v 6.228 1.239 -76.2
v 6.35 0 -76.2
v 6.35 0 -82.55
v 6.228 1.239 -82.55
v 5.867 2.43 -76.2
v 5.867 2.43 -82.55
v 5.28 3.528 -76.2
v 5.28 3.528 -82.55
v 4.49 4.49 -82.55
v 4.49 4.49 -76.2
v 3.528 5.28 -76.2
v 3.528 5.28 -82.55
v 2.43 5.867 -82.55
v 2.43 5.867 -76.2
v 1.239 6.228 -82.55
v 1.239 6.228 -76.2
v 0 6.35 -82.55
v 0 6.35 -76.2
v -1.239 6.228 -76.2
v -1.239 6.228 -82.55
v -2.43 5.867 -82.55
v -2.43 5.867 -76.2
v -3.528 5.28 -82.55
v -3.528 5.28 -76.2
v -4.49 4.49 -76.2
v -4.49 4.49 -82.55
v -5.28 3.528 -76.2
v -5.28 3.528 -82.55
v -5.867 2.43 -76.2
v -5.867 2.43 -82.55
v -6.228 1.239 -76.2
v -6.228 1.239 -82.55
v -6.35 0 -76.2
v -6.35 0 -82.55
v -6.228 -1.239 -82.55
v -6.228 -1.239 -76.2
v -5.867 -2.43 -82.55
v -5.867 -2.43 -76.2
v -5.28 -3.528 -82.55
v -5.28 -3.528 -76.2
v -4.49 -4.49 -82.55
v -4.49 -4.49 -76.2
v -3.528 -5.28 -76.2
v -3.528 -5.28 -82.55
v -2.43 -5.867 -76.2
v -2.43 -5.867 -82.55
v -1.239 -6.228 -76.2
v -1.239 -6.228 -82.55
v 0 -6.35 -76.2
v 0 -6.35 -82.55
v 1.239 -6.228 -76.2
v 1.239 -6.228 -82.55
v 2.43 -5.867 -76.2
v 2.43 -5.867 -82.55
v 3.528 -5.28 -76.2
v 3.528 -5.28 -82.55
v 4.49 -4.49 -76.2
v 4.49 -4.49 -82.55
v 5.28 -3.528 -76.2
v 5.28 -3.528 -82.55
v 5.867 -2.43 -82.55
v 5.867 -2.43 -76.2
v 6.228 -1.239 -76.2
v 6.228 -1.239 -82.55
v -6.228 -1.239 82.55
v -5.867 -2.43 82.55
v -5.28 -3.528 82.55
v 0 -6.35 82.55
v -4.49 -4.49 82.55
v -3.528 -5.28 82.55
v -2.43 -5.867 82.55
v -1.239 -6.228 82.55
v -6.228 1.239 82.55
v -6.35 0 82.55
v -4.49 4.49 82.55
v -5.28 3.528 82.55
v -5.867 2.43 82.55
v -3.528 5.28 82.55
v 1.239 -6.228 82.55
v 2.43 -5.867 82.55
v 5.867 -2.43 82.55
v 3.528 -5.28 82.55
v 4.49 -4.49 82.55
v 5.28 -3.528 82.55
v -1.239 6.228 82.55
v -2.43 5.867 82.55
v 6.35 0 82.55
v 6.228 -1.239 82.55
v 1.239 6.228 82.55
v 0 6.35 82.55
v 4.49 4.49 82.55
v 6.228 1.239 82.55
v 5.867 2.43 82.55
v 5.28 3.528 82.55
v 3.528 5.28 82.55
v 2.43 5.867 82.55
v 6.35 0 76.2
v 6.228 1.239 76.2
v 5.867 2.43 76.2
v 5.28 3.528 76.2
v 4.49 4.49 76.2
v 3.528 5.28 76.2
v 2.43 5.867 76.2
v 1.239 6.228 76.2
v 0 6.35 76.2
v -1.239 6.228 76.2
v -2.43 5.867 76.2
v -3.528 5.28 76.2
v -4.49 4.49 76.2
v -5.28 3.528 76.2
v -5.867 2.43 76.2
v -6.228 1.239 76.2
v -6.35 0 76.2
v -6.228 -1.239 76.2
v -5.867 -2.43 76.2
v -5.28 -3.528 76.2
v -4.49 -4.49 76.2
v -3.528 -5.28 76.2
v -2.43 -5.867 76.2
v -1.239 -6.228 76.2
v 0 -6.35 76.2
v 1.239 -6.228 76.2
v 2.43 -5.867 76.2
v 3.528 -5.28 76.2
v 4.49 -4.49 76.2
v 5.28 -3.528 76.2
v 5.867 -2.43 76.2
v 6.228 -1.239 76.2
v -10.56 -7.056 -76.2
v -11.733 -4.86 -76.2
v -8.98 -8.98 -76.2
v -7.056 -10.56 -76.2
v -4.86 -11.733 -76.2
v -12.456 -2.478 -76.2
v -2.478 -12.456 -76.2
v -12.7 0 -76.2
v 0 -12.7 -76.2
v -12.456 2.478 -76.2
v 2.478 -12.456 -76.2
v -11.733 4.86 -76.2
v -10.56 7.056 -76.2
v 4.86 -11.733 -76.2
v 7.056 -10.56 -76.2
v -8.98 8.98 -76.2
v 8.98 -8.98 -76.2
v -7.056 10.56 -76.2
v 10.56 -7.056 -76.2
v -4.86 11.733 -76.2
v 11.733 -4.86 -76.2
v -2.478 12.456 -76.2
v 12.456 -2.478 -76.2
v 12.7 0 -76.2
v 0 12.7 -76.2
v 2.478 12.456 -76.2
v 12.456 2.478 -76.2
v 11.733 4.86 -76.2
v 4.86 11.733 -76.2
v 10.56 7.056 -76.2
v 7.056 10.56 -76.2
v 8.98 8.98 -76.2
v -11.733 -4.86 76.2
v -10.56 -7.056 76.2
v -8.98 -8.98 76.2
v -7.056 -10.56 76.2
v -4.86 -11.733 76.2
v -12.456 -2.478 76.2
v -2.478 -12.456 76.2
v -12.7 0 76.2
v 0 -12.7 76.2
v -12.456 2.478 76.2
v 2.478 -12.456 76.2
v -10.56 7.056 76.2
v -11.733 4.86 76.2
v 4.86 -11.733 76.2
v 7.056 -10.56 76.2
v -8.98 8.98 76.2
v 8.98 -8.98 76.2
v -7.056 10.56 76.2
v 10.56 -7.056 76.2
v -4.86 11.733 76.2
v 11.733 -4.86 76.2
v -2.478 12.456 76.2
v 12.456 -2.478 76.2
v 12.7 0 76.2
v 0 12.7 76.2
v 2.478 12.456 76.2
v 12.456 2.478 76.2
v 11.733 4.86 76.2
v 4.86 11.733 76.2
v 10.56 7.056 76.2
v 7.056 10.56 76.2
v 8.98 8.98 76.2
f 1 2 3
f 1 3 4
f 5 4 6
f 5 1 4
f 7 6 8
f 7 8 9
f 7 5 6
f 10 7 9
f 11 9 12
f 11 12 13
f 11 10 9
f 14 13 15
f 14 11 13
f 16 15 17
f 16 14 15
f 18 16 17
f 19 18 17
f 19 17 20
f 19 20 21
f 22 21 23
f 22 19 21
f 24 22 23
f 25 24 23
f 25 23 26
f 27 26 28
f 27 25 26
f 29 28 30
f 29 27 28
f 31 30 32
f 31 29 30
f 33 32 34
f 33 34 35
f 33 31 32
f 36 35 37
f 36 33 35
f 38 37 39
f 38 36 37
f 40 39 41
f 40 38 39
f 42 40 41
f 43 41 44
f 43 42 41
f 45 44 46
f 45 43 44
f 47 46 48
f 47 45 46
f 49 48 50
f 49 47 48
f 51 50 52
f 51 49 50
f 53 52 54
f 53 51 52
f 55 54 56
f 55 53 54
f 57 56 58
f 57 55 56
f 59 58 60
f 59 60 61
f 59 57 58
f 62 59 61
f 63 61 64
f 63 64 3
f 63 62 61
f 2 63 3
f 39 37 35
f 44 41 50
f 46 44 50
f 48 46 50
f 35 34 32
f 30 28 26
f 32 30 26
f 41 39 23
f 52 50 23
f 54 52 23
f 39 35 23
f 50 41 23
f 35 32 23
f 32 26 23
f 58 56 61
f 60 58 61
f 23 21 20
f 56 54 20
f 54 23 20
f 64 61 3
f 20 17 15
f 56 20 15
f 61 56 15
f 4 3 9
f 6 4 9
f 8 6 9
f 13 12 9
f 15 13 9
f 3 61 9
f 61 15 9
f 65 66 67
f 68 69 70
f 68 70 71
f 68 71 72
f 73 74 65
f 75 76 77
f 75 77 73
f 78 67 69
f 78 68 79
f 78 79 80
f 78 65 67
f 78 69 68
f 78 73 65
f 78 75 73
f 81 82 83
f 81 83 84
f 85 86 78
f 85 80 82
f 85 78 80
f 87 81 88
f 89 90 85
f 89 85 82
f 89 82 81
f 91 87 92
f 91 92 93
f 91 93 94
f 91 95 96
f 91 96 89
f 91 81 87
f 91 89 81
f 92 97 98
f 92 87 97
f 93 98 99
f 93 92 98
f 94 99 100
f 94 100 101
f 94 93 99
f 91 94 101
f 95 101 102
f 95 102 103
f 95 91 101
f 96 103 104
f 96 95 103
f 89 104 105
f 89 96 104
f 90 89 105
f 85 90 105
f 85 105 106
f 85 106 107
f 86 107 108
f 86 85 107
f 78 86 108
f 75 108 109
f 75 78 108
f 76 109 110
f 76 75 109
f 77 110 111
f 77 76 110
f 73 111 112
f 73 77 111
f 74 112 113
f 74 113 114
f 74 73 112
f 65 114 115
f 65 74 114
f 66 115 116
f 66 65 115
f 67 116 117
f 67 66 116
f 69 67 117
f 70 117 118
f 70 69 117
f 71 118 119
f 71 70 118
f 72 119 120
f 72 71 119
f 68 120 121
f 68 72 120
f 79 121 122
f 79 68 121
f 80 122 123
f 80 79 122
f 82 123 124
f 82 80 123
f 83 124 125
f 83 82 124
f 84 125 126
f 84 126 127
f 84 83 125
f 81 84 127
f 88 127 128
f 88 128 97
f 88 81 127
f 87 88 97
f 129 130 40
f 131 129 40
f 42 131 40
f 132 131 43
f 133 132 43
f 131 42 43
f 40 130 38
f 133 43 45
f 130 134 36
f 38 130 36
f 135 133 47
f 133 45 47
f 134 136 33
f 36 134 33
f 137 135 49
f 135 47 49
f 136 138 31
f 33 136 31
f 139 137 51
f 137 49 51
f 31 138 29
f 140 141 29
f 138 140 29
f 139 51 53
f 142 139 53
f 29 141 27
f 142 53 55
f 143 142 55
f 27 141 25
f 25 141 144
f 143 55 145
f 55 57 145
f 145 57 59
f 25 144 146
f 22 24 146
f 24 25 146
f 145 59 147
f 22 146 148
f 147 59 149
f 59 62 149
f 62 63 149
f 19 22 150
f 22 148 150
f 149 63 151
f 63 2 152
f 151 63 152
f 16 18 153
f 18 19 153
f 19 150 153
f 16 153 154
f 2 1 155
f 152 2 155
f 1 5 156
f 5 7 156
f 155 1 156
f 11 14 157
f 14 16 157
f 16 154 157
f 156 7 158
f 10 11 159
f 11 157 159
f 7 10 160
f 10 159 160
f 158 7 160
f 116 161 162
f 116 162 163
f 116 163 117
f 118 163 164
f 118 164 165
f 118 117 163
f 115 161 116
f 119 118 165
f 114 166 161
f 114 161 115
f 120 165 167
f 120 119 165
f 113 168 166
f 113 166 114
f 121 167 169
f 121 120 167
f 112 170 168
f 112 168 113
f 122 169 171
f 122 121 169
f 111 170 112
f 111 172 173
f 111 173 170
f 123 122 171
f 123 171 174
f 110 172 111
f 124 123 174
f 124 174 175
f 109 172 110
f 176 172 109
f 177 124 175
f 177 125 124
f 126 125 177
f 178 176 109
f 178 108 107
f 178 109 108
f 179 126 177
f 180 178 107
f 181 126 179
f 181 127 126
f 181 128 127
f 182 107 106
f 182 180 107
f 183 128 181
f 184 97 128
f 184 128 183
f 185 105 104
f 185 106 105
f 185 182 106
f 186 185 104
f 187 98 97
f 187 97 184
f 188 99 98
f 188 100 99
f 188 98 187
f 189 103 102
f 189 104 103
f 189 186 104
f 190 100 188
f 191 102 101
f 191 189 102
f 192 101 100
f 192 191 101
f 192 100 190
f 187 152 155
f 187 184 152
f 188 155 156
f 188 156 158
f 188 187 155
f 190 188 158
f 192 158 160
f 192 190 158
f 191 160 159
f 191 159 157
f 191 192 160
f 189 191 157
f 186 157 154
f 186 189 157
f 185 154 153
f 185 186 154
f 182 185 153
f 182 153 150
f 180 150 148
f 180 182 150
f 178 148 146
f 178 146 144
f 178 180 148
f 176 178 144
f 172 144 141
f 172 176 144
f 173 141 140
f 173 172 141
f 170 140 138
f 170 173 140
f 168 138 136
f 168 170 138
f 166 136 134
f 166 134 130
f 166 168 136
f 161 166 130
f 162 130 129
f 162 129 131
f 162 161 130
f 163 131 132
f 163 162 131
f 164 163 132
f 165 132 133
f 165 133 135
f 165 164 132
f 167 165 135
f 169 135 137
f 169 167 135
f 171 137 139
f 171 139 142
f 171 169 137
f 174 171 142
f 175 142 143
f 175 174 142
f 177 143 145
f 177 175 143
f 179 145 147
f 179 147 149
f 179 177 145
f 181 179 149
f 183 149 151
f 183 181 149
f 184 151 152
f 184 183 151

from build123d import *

# Parameters (mm, degrees)
F0_R     = 12.7
F1_DEPTH = 76.2
F2_R     = 6.35
F3_DEPTH = 82.55


with BuildPart() as f1:
    # F0 (on Top) → F1 (new body, symmetric)
    with BuildSketch(Plane.XY):
        Circle(F0_R)
    extrude(amount=F1_DEPTH, both=True)

    # F2 (on Top) → F3 (join, symmetric)
    with BuildSketch(Plane.XY):
        Circle(F2_R)
    extrude(amount=F3_DEPTH, both=True)


solid = f1.part
